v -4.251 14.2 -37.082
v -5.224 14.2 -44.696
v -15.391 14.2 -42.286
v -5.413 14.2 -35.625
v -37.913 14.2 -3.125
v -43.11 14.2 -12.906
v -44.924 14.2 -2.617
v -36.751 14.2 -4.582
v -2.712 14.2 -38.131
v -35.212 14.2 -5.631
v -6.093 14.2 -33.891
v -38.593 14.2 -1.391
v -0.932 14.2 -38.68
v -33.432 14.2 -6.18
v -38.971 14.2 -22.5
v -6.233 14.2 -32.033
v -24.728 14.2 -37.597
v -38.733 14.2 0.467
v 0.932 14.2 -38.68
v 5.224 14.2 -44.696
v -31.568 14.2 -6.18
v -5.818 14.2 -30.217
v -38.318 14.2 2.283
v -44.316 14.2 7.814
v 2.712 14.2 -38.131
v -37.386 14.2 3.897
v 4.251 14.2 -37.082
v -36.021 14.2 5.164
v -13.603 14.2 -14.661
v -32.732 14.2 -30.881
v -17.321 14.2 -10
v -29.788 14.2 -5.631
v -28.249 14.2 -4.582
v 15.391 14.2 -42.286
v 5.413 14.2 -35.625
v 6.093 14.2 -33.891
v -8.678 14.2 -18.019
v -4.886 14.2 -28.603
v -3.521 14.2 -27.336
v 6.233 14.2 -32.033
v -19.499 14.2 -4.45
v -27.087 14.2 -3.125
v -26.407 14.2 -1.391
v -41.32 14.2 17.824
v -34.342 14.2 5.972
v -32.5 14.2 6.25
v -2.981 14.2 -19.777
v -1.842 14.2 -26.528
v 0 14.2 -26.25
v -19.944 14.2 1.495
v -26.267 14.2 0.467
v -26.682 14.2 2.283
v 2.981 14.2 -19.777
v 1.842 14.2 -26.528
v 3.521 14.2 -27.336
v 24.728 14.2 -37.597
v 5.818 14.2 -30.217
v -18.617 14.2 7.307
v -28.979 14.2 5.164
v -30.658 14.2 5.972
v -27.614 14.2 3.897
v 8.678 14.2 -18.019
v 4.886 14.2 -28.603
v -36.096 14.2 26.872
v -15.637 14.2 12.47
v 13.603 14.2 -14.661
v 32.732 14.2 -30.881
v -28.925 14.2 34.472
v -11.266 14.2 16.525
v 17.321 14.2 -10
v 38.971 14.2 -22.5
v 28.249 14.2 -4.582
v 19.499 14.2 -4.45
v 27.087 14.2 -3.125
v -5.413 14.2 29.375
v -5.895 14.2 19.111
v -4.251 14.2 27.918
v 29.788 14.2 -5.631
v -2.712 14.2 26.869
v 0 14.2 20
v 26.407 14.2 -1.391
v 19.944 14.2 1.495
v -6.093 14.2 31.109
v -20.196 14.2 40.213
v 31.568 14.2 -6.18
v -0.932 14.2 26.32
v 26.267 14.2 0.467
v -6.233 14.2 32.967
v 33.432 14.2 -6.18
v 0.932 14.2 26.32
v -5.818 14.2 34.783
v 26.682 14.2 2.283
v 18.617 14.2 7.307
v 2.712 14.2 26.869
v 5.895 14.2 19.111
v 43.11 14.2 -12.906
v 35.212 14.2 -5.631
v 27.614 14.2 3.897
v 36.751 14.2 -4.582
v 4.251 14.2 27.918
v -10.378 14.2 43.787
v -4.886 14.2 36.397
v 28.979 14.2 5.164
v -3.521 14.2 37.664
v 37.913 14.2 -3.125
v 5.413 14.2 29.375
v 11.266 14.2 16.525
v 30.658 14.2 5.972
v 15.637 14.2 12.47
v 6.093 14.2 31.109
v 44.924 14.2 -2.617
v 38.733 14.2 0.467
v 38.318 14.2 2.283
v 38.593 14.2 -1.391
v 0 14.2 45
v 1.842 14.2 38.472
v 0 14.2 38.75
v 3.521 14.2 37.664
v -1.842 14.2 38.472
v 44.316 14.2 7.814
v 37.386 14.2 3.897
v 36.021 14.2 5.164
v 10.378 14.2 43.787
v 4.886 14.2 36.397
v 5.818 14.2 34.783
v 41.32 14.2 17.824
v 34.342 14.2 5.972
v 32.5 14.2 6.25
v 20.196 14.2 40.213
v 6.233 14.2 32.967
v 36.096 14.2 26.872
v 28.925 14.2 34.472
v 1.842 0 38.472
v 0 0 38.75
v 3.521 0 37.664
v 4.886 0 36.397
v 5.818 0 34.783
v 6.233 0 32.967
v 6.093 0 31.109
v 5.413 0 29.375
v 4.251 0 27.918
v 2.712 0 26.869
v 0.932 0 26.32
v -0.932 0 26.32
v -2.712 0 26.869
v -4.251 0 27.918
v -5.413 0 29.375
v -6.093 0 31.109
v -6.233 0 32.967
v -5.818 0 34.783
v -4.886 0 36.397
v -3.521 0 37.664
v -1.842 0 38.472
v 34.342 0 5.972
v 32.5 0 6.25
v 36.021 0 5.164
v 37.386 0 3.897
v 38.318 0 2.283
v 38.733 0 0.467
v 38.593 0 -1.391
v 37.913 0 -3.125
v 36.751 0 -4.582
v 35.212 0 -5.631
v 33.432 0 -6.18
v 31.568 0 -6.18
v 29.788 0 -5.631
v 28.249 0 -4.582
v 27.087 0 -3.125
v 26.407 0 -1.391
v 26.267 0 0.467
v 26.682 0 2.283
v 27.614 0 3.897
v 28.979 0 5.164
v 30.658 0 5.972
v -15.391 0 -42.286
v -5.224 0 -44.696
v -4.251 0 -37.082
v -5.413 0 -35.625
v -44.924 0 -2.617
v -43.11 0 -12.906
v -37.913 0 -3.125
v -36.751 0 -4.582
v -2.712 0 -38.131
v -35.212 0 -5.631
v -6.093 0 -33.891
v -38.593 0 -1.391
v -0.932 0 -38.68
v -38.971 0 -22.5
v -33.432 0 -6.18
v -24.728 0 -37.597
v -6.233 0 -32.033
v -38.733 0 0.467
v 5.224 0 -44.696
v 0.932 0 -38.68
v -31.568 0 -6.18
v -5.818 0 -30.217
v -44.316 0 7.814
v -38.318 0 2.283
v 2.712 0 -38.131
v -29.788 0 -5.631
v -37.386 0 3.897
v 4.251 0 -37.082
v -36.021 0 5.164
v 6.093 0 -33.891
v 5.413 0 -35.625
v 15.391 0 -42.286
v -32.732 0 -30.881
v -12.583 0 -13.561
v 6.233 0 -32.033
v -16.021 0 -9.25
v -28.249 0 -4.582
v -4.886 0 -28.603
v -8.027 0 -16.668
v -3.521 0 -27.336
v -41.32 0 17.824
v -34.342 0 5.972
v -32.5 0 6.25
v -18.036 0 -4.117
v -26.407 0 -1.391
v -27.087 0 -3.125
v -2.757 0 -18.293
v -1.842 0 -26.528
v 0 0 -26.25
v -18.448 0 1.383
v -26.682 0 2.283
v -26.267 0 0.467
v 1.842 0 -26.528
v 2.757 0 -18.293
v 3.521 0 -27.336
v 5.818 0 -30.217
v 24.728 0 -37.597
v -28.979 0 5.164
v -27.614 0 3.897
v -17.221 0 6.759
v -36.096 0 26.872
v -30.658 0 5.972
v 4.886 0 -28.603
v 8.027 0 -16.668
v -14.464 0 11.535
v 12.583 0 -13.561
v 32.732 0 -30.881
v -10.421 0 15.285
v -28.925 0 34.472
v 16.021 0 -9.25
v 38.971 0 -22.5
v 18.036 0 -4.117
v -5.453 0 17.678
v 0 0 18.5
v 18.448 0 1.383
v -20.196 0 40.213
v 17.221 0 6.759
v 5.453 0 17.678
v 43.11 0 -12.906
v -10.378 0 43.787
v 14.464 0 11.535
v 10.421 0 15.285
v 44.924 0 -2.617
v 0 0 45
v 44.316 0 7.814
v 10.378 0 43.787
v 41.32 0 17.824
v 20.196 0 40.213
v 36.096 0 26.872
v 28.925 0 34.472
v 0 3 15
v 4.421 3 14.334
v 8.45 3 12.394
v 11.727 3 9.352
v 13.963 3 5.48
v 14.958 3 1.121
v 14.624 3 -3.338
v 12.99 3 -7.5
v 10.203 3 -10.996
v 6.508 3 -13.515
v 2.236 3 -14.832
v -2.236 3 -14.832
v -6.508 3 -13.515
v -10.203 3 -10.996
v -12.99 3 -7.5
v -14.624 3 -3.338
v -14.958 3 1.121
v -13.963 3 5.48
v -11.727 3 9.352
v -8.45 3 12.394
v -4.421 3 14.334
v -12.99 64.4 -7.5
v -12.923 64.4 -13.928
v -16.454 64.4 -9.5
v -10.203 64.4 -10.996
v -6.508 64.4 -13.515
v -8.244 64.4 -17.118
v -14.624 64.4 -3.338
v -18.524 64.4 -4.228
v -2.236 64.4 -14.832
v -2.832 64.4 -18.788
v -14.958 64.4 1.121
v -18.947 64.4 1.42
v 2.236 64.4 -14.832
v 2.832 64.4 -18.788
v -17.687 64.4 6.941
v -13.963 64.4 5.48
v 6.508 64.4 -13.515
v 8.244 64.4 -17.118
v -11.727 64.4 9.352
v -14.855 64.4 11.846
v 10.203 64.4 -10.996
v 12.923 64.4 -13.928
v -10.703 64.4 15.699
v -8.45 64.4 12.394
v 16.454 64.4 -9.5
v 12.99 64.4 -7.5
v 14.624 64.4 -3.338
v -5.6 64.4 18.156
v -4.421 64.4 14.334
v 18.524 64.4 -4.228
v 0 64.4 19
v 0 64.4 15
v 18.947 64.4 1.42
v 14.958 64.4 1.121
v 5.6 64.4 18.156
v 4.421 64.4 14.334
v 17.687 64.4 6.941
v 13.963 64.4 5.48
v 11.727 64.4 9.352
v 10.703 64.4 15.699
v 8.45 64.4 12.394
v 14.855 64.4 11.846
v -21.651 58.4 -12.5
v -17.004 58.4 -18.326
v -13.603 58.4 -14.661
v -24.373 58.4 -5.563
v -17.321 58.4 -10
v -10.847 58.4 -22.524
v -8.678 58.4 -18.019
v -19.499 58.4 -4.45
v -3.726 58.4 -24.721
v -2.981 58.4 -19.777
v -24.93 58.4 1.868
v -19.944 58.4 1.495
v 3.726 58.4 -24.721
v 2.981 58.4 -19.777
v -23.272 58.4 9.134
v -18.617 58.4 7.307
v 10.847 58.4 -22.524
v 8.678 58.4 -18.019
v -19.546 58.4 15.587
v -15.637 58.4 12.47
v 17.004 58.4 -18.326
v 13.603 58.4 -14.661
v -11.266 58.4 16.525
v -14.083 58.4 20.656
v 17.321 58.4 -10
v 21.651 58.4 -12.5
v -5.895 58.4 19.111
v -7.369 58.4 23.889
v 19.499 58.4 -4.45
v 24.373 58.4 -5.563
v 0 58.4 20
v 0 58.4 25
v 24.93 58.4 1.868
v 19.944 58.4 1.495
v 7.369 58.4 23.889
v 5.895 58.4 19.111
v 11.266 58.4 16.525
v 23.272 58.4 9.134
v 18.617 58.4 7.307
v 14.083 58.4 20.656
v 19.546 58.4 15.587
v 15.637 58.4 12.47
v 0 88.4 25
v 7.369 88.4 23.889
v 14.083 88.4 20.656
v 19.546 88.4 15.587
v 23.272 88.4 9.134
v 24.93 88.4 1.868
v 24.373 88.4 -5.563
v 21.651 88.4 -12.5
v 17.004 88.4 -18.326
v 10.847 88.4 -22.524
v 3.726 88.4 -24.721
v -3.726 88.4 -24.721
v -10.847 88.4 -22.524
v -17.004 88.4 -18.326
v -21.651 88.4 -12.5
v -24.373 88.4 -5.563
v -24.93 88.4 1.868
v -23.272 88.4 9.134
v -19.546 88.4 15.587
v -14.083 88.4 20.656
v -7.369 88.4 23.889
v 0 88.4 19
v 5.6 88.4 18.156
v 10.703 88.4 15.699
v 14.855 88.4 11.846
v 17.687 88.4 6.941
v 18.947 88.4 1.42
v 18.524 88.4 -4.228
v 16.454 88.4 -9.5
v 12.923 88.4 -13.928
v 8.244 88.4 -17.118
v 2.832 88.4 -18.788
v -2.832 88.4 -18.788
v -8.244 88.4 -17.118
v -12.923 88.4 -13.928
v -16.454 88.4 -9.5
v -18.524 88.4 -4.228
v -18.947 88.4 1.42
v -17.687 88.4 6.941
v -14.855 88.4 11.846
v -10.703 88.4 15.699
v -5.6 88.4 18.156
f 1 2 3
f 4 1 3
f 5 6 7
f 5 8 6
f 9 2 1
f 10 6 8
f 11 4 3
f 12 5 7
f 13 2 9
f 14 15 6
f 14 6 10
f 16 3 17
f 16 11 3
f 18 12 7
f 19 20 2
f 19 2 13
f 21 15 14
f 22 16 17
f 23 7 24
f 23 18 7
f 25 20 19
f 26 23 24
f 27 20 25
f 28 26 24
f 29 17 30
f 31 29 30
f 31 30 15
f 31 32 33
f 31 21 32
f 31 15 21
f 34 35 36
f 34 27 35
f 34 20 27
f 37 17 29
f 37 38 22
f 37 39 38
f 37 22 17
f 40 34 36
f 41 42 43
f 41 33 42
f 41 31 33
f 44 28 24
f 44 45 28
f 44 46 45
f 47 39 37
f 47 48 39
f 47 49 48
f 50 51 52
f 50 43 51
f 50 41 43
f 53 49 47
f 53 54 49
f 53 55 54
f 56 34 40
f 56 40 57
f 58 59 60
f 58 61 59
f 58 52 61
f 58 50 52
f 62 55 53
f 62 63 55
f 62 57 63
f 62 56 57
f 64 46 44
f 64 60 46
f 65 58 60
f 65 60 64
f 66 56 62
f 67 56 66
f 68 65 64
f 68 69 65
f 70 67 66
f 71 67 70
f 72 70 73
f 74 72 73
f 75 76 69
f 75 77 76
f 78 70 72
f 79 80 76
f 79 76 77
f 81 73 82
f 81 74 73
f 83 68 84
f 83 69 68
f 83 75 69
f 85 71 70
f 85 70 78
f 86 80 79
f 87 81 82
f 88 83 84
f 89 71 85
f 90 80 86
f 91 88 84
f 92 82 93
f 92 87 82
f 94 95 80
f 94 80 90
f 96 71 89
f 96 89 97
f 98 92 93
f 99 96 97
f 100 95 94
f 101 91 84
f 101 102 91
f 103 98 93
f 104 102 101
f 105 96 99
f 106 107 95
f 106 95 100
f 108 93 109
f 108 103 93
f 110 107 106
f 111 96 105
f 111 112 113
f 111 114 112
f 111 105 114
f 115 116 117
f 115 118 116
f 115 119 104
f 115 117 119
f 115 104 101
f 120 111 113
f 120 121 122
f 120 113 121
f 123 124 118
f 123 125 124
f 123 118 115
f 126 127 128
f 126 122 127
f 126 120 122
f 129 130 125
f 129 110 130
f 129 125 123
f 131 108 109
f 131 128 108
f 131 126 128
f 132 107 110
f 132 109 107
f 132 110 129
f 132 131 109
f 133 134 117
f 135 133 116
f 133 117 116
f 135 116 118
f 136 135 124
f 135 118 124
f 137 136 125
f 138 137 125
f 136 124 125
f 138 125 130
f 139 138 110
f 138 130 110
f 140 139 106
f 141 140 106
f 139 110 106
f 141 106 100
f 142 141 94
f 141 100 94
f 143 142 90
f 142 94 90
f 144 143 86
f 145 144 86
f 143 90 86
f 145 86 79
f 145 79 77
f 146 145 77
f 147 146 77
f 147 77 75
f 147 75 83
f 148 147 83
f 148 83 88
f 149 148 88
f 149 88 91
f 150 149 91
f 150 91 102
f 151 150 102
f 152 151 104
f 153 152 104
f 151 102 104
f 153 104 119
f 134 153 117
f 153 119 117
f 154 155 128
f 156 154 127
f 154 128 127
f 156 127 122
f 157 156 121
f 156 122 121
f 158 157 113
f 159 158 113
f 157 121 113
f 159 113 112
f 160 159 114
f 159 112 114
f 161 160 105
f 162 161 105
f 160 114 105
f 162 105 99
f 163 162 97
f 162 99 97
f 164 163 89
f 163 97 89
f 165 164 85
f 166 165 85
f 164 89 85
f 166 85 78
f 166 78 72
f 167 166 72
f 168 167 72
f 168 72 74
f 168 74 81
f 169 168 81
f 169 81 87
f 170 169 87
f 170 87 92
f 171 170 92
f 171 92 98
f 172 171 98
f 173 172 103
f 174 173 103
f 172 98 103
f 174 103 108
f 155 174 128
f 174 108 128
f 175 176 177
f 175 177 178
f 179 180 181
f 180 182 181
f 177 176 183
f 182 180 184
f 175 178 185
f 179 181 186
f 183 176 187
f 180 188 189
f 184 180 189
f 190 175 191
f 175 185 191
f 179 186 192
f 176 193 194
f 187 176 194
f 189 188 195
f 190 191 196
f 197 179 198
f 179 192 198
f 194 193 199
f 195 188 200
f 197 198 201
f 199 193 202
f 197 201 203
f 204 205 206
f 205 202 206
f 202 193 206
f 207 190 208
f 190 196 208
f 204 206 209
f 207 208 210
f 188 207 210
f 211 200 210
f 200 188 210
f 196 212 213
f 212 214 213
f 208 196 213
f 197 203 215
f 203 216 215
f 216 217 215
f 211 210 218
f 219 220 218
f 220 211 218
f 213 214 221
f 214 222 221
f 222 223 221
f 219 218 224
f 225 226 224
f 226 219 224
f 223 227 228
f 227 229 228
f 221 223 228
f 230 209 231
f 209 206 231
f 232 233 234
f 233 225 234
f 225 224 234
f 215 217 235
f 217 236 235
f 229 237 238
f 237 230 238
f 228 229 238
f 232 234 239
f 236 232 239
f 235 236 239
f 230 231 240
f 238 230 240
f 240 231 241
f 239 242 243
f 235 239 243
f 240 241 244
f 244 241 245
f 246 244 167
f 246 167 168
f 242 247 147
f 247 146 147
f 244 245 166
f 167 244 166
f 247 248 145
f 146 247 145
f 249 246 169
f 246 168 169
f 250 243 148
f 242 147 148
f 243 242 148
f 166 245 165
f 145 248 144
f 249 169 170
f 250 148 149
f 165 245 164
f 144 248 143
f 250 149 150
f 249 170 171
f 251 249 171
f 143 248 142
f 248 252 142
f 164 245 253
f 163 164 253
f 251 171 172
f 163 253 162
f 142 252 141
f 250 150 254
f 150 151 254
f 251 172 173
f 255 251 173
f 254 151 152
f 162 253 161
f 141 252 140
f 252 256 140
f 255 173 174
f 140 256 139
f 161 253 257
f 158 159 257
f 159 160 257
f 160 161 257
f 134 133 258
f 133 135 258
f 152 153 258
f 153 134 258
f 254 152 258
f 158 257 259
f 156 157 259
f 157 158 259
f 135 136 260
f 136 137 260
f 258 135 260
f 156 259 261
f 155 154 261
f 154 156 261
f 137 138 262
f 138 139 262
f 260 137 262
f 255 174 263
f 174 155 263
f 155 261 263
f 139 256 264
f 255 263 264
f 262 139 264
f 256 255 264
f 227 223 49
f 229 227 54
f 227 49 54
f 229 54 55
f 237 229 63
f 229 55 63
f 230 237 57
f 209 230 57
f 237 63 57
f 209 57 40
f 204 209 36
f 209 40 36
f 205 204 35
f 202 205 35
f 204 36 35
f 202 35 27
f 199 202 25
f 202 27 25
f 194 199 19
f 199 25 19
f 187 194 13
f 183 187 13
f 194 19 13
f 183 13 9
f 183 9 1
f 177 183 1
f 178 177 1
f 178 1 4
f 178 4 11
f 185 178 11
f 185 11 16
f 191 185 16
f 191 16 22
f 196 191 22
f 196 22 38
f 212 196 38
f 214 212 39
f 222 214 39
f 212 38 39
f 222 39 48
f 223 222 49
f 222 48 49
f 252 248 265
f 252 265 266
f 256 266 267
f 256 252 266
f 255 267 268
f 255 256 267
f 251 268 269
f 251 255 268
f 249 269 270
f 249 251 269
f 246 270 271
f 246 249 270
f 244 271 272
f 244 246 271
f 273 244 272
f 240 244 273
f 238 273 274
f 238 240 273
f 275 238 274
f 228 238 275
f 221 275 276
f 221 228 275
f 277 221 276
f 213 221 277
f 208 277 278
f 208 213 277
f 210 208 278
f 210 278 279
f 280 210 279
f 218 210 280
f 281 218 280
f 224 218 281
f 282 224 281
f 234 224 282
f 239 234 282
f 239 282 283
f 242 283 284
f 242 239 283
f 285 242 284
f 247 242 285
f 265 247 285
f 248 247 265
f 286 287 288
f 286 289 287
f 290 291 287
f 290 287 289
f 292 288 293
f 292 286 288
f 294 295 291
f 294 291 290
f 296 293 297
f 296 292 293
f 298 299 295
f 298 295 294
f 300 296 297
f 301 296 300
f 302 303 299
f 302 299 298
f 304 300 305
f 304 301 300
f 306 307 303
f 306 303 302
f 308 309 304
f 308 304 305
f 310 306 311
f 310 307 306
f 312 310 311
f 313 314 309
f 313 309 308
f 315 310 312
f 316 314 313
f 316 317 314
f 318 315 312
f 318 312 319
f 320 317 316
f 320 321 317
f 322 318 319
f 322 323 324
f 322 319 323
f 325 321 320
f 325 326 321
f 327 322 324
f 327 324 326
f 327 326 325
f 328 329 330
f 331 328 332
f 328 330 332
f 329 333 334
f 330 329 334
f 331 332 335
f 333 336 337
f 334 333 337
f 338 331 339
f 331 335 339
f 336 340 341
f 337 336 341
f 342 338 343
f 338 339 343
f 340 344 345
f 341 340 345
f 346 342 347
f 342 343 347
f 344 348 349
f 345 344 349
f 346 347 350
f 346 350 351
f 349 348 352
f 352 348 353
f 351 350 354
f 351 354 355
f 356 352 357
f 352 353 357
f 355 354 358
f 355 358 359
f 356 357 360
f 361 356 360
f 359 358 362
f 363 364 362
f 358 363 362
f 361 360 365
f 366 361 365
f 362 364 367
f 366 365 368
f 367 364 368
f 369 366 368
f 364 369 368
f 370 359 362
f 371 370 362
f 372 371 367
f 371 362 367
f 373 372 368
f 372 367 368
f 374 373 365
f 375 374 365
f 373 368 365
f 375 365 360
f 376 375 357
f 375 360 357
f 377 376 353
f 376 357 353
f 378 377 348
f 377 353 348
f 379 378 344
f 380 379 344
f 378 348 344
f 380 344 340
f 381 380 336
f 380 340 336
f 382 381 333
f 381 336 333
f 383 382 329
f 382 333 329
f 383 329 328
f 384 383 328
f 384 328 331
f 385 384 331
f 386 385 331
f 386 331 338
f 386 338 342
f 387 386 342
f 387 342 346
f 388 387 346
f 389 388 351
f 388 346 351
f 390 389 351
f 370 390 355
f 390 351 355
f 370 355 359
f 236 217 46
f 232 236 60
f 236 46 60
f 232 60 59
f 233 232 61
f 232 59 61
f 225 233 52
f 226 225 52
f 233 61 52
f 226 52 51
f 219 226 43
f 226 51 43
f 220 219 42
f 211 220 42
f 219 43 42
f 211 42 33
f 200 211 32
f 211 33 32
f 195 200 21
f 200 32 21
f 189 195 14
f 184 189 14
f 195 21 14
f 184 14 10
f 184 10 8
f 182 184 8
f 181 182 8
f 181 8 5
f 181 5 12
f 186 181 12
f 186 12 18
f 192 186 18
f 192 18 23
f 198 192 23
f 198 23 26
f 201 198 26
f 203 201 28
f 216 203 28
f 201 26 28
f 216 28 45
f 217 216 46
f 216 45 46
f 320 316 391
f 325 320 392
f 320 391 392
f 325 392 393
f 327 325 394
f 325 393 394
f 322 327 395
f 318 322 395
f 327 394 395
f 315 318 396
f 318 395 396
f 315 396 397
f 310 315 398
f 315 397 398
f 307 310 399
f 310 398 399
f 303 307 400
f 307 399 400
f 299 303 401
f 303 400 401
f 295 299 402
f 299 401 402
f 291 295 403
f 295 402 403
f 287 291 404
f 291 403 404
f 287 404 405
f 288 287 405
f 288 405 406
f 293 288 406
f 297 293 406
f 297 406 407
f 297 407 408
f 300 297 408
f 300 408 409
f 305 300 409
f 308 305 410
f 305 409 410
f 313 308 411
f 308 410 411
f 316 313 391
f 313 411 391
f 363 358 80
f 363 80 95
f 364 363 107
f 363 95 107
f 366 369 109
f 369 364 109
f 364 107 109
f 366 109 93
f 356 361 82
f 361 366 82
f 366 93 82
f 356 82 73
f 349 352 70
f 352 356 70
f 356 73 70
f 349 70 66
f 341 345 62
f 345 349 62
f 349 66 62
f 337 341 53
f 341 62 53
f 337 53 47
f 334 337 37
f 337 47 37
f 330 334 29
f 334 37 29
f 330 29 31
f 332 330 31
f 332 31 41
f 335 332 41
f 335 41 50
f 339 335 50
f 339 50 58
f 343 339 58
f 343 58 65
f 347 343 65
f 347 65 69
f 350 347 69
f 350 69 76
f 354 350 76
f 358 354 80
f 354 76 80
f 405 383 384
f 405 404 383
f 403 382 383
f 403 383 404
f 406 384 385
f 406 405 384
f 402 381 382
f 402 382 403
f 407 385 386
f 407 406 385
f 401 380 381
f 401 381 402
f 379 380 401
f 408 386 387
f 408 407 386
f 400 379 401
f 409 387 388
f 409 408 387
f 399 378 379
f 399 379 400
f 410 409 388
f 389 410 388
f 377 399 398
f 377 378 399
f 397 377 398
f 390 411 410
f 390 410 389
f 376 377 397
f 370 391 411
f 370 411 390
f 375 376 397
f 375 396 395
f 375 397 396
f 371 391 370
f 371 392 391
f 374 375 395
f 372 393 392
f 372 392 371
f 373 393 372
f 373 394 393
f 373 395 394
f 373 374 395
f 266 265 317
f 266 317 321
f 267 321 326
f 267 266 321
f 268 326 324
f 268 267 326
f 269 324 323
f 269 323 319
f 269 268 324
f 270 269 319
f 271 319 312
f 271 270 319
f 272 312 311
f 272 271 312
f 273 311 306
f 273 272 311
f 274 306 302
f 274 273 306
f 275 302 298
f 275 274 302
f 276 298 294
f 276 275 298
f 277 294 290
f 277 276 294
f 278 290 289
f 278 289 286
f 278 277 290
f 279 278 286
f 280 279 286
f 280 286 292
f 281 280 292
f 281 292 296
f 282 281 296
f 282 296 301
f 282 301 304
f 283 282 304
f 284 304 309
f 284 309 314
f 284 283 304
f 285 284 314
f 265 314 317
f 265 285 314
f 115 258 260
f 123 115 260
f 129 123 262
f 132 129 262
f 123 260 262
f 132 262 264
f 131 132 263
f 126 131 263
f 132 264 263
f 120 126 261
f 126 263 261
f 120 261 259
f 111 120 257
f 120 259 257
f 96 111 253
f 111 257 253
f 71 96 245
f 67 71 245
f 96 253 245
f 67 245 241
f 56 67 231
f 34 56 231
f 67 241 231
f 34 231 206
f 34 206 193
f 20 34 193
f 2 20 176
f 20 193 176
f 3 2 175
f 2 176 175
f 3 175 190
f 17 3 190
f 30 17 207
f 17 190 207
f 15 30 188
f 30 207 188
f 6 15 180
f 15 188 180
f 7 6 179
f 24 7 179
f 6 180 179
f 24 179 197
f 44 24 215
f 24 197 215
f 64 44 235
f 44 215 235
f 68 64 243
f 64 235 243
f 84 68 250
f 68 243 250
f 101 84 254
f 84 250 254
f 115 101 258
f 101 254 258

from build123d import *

# Parameters (mm, degrees)
CROQUIS2_R              = 45
SALIENTE_EXTRUIR1_DEPTH = 14.2
CROQUIS3_R              = 20
SALIENTE_EXTRUIR3_DEPTH = 77.4
CROQUIS7_R              = 25
SALIENTE_EXTRUIR5_DEPTH = 30
CROQUIS13_R             = 15
CORTAR_EXTRUIR4_DEPTH   = 64.4
CHAFL_N1_SIZE           = 3
CHAFL_N1_SIZE2          = 3.5
CROQUIS14_R             = 19
CORTAR_EXTRUIR5_DEPTH   = 24
CROQUIS15_R             = 6.25
CORTAR_EXTRUIR6_DEPTH   = 14.2


with BuildPart() as part:
    # Croquis2 → Saliente-Extruir1 (new body)
    with BuildSketch(Plane(origin=(0, 0, 0), x_dir=(1, 0, 0), z_dir=(0, 1, 0))):
        with Locations(Location((0, 0, 0), (0, 0, 270))):
            Circle(CROQUIS2_R)
    extrude(amount=SALIENTE_EXTRUIR1_DEPTH)

    # Croquis3 → Saliente-Extruir3 (add)
    with BuildSketch(Plane(origin=(0, 0, 0), x_dir=(1, 0, 0), z_dir=(0, 1, 0))):
        with Locations(Location((0, 0, 0), (0, 0, 270))):
            Circle(CROQUIS3_R)
    extrude(amount=SALIENTE_EXTRUIR3_DEPTH)

    # Croquis7 → Saliente-Extruir5 (add)
    with BuildSketch(Plane(origin=(0, 58.4, 0), x_dir=(1, 0, 0), z_dir=(0, 1, 0))):
        with Locations(Location((0, 0, 0), (0, 0, 270))):
            Circle(CROQUIS7_R)
    extrude(amount=SALIENTE_EXTRUIR5_DEPTH)

    # Croquis13 → Cortar-Extruir4 (cut)
    with BuildSketch(Plane(origin=(0, 0, 0), x_dir=(1, 0, 0), z_dir=(0, 1, 0))):
        with Locations(Location((0, 0, 0), (0, 0, 270))):
            Circle(CROQUIS13_R)
    extrude(amount=CORTAR_EXTRUIR4_DEPTH, mode=Mode.SUBTRACT)

    # Chaflán1
    chafl_n1_edges = [part.edges().sort_by_distance(p)[0] for p in [
        (0, 0, -15),
    ]]
    chafl_n1_side = [part.faces().sort_by_distance(p)[0] for p in [
        (0, 32.2, -15),
    ]]
    chamfer(chafl_n1_edges, length=CHAFL_N1_SIZE, length2=CHAFL_N1_SIZE2, reference=chafl_n1_side[0])

    # Croquis14 → Cortar-Extruir5 (cut)
    with BuildSketch(Plane(origin=(0, 88.4, 0), x_dir=(1, 0, 0), z_dir=(0, 1, 0))):
        with Locations(Location((0, 0, 0), (0, 0, 270))):
            Circle(CROQUIS14_R)
    extrude(amount=-CORTAR_EXTRUIR5_DEPTH, mode=Mode.SUBTRACT)

    # Croquis15 → Cortar-Extruir6 (cut)
    with BuildSketch(Plane(origin=(0, 14.2, 0), x_dir=(1, 0, 0), z_dir=(0, 1, 0))):
        with Locations(Location((0, -32.5, 0), (0, 0, 270))):
            Circle(CROQUIS15_R)
        with Locations(Location((-32.5, 0, 0), (0, 0, 270))):
            Circle(CROQUIS15_R)
        with Locations(Location((0, 32.5, 0), (0, 0, 270))):
            Circle(CROQUIS15_R)
        with Locations(Location((32.5, 0, 0), (0, 0, 270))):
            Circle(CROQUIS15_R)
    extrude(amount=-CORTAR_EXTRUIR6_DEPTH, mode=Mode.SUBTRACT)


solid = part.part
